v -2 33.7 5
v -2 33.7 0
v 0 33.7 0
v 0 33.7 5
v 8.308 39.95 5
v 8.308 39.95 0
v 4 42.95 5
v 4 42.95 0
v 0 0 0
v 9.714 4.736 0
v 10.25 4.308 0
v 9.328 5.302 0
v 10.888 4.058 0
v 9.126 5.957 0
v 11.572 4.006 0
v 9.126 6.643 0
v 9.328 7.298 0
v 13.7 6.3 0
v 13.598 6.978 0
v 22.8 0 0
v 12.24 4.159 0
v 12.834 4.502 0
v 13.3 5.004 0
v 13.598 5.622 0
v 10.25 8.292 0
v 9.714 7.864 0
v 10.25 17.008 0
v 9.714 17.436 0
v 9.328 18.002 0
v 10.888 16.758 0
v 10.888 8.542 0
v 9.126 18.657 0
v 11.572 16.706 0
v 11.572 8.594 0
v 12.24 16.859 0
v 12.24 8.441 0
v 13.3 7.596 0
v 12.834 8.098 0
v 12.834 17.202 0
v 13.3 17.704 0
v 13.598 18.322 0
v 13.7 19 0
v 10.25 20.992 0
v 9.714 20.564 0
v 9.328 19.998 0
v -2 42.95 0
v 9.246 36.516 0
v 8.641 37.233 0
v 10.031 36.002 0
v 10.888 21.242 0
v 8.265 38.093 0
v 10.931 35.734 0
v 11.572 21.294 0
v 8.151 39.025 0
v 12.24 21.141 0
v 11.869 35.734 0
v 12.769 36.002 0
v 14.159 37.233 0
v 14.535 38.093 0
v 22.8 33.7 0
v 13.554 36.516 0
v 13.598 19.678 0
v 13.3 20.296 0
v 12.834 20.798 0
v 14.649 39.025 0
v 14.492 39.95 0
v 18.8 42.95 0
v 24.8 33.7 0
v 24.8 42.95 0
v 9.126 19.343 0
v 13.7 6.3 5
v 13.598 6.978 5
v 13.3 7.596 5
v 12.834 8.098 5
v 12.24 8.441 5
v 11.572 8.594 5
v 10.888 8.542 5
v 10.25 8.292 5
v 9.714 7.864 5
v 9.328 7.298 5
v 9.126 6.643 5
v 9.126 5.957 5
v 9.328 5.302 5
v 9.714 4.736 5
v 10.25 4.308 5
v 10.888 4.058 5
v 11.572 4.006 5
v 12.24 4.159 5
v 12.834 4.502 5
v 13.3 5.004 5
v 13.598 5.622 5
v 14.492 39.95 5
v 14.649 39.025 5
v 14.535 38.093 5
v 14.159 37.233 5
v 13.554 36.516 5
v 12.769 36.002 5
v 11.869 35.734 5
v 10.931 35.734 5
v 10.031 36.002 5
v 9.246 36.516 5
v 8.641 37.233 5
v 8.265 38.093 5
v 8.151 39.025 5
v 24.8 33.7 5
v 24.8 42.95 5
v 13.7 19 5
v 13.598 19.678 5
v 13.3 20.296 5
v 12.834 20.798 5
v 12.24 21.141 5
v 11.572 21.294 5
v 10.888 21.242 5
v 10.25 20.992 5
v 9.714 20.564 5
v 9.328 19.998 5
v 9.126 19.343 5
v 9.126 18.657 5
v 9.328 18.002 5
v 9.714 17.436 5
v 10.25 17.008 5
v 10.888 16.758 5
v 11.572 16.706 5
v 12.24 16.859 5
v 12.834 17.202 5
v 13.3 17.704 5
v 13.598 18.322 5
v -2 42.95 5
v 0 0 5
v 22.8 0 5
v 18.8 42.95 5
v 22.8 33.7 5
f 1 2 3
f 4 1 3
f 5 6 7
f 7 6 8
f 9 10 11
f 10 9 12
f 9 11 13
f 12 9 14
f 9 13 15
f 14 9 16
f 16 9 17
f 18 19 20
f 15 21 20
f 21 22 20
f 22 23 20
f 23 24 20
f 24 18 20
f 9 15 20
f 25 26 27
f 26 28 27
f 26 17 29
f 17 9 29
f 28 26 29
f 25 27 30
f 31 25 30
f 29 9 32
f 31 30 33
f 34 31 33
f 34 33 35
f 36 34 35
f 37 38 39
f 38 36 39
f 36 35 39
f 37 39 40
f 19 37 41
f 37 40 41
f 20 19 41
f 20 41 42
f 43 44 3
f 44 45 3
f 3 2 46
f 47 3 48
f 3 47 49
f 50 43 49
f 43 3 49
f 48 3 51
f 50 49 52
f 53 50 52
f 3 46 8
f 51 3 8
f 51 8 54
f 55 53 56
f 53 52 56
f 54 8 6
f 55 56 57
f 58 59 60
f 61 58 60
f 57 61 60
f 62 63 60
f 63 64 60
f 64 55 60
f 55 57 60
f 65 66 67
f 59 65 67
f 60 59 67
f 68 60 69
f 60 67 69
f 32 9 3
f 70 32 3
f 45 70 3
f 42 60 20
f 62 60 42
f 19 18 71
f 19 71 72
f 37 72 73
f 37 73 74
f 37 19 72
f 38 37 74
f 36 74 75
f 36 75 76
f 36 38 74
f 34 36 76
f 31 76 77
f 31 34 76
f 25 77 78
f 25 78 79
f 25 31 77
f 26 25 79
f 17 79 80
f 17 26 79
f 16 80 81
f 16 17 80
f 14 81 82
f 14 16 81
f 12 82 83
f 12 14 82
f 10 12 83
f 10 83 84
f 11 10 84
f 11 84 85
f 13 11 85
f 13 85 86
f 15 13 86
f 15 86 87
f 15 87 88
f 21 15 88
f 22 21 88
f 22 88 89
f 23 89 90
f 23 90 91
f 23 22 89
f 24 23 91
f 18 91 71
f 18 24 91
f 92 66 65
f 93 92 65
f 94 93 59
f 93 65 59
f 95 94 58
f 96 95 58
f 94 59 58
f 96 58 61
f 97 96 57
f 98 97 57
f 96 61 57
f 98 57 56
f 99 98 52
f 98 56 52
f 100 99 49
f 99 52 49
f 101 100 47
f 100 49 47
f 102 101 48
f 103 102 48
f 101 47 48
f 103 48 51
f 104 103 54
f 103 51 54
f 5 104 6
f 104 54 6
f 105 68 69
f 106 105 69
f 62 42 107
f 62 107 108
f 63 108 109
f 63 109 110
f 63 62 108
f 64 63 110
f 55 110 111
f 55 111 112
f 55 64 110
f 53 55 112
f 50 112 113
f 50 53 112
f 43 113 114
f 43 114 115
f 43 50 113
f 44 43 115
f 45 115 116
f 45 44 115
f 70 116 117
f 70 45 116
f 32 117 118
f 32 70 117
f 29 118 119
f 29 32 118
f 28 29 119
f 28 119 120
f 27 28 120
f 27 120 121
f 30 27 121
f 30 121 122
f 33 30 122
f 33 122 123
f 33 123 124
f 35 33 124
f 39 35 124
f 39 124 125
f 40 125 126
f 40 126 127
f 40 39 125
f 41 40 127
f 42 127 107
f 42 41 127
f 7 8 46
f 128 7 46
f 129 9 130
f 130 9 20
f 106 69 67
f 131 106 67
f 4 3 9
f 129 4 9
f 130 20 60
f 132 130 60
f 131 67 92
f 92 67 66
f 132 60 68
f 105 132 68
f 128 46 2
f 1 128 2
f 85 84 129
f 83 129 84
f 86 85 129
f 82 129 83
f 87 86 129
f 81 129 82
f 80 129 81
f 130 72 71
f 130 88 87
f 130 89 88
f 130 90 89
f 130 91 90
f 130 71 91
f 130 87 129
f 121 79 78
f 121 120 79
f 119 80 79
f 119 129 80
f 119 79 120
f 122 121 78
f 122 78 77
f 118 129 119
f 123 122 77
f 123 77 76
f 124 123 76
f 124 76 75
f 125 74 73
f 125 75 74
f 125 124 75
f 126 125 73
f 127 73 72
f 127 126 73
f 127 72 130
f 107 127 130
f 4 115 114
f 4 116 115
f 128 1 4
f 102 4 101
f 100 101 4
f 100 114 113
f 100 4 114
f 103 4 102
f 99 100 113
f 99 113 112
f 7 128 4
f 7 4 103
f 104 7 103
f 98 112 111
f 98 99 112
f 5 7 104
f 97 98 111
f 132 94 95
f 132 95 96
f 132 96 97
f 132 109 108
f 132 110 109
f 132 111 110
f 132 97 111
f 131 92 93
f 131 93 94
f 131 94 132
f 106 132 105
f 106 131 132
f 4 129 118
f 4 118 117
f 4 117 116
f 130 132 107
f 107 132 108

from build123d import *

# Parameters (mm, degrees)
F0_R     = 2.3
F1_DEPTH = 5


with BuildPart() as f1:
    # F0 (on Top) → F1 (new body)
    with BuildSketch(Plane.XY):
        with BuildLine():
            Line((4, 42.95), (0, 42.95))
            Line((0, 42.95), (-2, 42.95))
            Line((-2, 42.95), (-2, 33.7))
            Line((-2, 33.7), (0, 33.7))
            Line((0, 33.7), (0, 0))
            Line((0, 0), (22.8, 0))
            Line((22.8, 0), (22.8, 33.7))
            Line((22.8, 33.7), (24.8, 33.7))
            Line((24.8, 33.7), (24.8, 42.95))
            Line((24.8, 42.95), (22.8, 42.95))
            Line((22.8, 42.95), (18.8, 42.95))
            Line((18.8, 42.95), (14.492329, 39.95))
            ThreePointArc((14.492329, 39.95), (11.4, 35.7), (8.307671, 39.95))
            Line((8.307671, 39.95), (4, 42.95))
        make_face()
        with Locations((11.4, 6.3)):
            Circle(F0_R, mode=Mode.SUBTRACT)
        with Locations((11.4, 19)):
            Circle(F0_R, mode=Mode.SUBTRACT)
    extrude(amount=F1_DEPTH)


solid = f1.part
